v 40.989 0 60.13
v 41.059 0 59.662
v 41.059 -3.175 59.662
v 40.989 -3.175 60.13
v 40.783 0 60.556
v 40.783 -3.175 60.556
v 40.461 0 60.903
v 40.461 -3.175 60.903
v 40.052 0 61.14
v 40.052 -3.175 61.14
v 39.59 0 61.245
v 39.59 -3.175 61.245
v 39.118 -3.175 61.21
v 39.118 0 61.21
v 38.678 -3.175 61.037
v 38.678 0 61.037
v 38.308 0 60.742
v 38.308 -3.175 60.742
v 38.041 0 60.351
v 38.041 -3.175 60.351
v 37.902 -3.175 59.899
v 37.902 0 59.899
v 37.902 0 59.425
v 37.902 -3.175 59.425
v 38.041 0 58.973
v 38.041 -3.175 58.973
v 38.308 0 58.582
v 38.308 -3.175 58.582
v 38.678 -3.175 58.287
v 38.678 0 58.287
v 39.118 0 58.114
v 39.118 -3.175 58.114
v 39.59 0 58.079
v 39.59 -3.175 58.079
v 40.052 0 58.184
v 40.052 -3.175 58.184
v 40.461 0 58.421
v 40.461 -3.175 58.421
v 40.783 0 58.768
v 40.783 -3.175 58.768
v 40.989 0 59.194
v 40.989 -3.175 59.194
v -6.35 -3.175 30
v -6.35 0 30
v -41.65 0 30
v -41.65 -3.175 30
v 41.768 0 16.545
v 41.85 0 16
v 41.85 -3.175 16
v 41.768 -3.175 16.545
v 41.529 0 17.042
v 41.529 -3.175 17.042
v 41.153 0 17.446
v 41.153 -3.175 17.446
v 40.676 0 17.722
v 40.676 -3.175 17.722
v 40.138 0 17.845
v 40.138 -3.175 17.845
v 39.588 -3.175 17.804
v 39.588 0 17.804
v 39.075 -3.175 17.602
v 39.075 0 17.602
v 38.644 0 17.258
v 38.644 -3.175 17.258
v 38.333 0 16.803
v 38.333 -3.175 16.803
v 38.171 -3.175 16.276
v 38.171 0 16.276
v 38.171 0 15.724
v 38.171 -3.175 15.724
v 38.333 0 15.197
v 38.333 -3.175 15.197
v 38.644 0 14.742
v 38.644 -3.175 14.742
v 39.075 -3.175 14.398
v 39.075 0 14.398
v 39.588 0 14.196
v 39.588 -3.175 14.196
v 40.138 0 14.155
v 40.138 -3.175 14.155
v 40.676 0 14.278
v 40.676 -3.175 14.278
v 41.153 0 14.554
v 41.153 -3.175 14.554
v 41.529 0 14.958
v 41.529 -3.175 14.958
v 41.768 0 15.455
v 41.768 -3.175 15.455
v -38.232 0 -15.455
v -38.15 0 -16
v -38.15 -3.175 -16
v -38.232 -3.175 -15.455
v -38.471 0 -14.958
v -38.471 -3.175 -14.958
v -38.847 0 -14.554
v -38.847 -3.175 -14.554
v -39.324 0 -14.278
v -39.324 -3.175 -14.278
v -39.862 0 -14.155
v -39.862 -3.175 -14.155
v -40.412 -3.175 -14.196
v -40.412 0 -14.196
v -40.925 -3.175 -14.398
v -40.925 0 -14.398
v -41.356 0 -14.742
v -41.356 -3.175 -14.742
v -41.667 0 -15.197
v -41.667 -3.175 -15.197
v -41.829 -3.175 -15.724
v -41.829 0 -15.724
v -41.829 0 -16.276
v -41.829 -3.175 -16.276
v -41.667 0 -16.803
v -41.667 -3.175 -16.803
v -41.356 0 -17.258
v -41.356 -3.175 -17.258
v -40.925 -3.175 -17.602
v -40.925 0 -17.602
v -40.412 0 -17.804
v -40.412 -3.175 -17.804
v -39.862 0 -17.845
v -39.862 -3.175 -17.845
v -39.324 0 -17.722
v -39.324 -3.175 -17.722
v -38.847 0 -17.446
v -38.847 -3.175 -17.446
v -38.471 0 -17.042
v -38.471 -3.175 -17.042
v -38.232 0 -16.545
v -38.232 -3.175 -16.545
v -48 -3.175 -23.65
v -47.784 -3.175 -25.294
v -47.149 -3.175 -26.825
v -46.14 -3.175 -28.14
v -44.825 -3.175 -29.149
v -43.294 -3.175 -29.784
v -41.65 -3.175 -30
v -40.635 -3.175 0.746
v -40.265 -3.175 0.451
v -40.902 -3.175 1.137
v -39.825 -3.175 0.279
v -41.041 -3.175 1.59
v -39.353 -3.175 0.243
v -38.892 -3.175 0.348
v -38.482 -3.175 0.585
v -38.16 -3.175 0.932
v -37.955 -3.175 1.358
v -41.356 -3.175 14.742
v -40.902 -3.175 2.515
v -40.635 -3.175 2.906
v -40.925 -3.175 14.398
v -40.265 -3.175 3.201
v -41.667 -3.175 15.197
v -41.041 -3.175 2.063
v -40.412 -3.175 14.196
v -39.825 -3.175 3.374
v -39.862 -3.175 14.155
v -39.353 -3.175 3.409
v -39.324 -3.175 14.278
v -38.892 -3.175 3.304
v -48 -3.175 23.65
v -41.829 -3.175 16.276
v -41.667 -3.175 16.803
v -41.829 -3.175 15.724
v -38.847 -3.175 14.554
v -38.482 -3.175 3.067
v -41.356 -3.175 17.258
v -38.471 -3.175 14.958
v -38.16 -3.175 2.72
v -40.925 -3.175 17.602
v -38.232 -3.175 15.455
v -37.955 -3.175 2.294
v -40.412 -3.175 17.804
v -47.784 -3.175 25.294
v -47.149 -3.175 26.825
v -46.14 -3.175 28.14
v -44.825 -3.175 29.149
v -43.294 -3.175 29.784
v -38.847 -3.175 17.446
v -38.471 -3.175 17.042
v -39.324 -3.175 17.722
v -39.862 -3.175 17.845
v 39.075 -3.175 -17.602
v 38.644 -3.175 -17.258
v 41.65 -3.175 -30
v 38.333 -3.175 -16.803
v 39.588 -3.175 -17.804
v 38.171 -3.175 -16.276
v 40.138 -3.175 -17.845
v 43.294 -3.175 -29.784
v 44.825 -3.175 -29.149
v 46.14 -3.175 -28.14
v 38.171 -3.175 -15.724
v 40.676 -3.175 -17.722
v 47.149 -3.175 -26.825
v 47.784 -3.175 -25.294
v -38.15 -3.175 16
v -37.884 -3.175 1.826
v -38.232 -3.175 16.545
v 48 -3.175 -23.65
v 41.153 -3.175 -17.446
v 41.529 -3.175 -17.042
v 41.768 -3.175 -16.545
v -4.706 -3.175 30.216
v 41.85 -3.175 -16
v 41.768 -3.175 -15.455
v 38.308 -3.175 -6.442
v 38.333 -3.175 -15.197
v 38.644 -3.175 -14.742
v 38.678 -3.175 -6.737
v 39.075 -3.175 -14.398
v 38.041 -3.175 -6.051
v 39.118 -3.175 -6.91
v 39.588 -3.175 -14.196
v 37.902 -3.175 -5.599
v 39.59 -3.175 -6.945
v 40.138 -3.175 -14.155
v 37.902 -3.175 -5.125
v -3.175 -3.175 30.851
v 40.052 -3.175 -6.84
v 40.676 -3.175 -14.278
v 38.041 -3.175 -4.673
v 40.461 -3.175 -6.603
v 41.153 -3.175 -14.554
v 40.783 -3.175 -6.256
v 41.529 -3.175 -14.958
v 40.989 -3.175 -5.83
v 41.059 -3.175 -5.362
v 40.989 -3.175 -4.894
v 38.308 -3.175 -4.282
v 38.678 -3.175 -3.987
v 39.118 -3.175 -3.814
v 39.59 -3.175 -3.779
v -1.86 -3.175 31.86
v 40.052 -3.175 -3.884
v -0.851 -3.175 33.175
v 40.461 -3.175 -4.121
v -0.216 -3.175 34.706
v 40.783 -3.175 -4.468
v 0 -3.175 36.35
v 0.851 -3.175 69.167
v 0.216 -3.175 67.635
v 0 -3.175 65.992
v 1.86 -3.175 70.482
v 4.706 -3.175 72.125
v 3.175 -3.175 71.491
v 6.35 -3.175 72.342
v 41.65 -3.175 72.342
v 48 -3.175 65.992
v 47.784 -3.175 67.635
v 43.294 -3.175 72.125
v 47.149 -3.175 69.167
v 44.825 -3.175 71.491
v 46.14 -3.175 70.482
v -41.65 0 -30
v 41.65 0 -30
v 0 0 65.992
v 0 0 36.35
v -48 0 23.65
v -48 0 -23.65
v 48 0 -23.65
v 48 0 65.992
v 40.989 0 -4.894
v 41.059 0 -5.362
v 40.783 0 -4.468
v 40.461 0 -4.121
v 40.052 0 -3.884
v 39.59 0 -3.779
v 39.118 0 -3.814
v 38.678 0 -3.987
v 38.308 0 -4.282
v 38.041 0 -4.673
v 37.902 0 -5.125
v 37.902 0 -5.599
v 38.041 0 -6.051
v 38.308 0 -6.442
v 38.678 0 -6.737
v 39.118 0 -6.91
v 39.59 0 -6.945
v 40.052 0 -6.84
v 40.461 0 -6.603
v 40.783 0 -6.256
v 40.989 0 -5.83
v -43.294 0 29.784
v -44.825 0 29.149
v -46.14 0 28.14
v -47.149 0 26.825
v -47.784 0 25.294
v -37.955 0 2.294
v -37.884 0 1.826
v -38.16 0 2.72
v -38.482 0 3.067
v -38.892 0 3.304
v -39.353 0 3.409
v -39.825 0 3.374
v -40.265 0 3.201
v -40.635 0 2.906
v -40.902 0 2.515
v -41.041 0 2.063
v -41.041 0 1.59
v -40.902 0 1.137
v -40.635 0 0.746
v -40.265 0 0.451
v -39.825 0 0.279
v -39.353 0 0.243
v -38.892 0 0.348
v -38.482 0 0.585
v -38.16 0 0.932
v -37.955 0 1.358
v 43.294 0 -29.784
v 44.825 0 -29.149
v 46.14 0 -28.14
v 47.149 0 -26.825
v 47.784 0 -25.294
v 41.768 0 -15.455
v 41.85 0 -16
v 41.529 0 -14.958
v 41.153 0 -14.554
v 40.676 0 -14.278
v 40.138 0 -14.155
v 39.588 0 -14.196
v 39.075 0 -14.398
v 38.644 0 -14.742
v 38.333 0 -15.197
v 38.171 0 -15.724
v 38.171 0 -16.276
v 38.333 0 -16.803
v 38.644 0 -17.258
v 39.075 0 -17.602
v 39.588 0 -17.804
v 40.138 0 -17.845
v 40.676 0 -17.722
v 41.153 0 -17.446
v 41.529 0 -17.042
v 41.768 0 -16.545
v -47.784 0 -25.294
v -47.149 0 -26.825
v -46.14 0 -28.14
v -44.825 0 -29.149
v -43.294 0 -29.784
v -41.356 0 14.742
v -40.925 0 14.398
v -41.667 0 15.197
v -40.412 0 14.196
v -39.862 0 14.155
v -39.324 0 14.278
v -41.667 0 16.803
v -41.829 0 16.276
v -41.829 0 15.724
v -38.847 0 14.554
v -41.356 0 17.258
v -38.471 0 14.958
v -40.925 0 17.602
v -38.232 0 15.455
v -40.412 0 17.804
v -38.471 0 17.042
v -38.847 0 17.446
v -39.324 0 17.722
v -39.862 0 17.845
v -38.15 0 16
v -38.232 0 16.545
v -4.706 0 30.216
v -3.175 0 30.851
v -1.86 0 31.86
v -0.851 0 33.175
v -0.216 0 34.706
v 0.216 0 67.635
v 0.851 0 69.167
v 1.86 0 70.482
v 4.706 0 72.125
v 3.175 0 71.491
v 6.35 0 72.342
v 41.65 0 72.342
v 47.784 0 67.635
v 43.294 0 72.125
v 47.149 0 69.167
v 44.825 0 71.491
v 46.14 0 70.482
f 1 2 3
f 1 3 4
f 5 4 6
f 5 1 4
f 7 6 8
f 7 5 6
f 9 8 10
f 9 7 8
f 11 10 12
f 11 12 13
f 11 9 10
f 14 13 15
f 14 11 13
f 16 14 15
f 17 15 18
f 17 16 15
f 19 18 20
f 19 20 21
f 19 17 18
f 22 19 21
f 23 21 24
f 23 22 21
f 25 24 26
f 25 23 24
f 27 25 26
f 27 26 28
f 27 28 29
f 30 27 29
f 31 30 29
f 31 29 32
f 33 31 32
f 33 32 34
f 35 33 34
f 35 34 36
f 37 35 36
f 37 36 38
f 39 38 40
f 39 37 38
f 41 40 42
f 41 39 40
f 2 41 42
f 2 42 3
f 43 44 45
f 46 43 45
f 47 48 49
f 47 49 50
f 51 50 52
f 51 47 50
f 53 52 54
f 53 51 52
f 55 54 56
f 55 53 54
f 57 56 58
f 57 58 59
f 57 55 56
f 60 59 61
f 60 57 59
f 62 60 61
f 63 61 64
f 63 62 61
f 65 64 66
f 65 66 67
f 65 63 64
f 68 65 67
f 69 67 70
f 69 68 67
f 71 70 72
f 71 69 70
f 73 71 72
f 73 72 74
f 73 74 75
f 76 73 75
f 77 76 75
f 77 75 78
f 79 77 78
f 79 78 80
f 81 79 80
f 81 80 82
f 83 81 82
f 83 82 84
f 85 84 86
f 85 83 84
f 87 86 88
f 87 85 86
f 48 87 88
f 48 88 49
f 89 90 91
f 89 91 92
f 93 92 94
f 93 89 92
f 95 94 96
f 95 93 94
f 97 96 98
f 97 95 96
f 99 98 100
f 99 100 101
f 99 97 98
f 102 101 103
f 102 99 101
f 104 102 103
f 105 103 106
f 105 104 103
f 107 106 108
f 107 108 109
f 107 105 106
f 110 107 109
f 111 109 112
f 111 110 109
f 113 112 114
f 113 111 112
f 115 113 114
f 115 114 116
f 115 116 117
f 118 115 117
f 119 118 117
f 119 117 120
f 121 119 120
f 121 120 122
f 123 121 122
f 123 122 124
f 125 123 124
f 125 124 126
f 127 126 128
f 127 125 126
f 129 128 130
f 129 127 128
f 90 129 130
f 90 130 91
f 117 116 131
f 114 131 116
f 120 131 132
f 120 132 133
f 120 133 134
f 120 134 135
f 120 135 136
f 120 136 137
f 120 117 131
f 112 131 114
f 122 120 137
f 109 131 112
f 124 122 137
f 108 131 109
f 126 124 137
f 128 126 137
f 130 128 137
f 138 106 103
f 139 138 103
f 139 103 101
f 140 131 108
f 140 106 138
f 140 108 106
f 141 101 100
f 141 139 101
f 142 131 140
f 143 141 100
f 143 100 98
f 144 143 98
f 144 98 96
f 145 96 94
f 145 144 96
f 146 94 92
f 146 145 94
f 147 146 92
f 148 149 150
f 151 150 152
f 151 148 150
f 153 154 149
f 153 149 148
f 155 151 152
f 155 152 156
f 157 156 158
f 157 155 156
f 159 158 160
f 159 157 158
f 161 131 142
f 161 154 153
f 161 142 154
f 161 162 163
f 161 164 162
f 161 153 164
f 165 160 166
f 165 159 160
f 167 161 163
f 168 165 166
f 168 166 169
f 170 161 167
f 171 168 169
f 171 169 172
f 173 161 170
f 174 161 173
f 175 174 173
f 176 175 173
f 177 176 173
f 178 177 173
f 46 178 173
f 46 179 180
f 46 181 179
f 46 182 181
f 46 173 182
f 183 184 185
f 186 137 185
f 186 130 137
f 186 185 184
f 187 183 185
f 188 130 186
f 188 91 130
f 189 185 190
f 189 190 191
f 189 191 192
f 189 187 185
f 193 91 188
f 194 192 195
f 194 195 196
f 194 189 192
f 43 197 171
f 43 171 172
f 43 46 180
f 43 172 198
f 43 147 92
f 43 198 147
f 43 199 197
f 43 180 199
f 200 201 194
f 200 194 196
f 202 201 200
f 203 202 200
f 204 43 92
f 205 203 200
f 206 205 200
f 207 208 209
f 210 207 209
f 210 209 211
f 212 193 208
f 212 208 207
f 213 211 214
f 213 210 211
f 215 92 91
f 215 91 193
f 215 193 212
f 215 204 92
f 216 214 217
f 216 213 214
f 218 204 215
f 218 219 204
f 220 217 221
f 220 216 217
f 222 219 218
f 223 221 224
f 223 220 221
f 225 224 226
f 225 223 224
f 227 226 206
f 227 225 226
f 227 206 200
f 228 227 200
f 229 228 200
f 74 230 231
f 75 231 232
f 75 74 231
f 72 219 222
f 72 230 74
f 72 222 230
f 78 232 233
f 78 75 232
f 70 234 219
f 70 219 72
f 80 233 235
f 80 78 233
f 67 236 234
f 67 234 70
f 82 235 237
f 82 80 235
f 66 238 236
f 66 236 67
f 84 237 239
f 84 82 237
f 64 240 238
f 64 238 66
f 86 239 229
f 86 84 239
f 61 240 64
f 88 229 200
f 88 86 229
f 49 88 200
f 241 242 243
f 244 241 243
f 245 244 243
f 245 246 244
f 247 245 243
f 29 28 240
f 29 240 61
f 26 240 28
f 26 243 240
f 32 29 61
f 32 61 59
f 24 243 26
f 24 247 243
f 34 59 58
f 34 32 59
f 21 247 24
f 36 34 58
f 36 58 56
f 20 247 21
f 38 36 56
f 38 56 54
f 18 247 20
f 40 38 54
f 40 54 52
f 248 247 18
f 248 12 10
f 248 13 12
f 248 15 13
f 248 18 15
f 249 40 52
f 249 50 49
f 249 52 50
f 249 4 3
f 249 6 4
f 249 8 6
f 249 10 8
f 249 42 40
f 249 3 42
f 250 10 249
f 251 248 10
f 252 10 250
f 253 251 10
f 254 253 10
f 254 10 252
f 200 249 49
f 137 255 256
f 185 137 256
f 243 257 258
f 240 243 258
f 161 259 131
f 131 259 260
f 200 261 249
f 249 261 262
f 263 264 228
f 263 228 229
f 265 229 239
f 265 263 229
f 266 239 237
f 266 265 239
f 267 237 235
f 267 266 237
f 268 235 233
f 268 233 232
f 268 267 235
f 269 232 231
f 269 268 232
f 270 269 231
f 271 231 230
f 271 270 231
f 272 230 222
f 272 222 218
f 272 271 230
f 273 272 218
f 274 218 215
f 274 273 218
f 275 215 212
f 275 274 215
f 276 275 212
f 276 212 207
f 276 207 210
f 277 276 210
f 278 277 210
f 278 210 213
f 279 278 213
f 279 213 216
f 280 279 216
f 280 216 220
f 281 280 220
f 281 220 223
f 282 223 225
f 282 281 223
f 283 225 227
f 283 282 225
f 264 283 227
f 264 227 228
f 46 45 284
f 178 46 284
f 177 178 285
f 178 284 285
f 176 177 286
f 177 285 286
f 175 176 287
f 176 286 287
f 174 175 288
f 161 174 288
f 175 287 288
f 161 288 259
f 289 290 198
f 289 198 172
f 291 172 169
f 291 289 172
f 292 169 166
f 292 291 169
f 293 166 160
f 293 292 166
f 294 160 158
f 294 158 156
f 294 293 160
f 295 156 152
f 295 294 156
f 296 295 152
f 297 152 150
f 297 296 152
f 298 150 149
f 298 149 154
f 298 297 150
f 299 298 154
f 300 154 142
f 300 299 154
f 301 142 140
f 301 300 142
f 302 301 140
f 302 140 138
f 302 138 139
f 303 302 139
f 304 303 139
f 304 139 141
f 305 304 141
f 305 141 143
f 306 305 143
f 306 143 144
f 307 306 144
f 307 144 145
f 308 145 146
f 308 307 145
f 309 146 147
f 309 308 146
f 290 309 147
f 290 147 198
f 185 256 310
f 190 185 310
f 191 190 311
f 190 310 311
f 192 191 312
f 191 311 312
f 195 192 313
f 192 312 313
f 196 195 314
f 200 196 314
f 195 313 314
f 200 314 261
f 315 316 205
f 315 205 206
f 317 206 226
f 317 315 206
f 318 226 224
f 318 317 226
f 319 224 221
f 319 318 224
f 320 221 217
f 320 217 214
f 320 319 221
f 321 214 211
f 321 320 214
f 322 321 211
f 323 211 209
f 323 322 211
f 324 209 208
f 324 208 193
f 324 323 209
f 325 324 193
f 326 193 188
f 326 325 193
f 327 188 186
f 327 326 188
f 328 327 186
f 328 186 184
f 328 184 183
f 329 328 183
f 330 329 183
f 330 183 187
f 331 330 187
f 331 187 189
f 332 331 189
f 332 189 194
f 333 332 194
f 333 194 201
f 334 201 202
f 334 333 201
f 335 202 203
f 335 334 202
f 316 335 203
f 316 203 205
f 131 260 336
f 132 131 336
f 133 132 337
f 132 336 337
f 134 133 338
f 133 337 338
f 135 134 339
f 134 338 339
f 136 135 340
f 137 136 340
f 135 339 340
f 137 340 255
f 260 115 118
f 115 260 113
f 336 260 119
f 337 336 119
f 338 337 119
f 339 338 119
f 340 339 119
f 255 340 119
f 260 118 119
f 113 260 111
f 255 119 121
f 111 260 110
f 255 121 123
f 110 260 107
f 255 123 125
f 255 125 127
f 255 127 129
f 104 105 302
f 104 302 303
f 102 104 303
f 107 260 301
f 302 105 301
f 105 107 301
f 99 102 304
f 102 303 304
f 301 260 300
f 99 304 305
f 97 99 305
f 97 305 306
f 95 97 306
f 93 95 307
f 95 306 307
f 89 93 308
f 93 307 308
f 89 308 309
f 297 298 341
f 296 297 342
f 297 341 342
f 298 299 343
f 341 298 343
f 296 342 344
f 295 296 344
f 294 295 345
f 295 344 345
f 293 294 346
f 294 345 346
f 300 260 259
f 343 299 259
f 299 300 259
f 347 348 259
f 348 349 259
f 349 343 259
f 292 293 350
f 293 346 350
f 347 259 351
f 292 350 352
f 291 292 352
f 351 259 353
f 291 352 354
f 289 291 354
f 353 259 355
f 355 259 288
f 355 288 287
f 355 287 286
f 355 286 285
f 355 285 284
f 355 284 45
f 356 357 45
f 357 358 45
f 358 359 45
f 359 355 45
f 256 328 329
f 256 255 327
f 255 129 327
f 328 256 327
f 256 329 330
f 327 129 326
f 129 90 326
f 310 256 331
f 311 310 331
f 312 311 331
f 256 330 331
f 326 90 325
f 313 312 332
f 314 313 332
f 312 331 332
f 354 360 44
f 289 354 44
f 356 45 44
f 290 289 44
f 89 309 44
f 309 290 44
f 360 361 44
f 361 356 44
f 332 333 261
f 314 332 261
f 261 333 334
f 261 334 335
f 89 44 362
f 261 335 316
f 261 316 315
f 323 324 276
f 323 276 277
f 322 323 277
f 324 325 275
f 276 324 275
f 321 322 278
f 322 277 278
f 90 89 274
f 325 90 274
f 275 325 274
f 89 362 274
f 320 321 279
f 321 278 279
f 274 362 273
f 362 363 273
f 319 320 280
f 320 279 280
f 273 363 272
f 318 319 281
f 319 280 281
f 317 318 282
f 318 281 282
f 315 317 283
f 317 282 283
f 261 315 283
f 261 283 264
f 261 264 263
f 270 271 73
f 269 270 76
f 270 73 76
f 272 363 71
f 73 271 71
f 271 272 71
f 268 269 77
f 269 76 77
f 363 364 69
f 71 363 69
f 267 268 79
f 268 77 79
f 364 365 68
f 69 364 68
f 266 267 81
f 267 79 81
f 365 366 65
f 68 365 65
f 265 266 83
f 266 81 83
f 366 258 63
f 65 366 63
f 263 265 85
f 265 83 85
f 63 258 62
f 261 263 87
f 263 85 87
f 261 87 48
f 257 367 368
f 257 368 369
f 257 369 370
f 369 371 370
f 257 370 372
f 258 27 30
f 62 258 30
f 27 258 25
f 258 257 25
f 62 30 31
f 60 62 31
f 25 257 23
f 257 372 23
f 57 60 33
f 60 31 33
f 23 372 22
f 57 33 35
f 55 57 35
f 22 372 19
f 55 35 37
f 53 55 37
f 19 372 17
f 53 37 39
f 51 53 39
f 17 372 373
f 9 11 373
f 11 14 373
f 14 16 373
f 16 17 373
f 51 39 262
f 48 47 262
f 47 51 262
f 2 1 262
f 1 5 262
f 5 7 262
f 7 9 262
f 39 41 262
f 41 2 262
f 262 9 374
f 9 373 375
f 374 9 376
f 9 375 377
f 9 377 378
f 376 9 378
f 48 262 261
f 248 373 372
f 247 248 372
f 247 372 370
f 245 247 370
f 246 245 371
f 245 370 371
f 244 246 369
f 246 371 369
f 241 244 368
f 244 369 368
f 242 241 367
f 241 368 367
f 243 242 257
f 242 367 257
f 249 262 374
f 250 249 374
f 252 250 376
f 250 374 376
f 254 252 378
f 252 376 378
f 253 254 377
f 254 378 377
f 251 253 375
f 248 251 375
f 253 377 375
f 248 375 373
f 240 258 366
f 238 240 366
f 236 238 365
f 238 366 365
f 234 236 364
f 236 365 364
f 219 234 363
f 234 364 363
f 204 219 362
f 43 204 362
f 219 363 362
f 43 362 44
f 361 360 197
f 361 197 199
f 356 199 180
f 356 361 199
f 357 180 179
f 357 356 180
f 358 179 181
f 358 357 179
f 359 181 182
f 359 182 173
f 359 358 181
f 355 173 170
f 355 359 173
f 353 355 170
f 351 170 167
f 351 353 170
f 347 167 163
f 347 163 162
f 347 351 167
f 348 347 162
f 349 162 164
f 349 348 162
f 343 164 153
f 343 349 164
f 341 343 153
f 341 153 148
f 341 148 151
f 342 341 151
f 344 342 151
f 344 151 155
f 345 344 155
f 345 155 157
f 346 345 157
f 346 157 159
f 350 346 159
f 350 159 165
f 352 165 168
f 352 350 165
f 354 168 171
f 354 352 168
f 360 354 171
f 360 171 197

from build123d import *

# Parameters (mm, degrees)
F0_R     = 1.85
F0_R_2   = 1.5875
F1_DEPTH = 3.175


with BuildPart() as f1:
    # F0 (on Front) → F1 (new body)
    with BuildSketch(Plane.XZ):
        with BuildLine():
            ThreePointArc((-48, -23.65), (-46.140128, -28.140128), (-41.65, -30))
            Line((-41.65, -30), (41.65, -30))
            ThreePointArc((41.65, -30), (46.140128, -28.140128), (48, -23.65))
            Line((48, -23.65), (48, 30))
            Line((48, 30), (48, 65.99177))
            ThreePointArc((48, 65.99177), (46.140128, 70.481898), (41.65, 72.34177))
            Line((41.65, 72.34177), (6.35, 72.34177))
            ThreePointArc((6.35, 72.34177), (1.859872, 70.481898), (0, 65.99177))
            Line((0, 65.99177), (0, 36.35))
            ThreePointArc((0, 36.35), (-1.859872, 31.859872), (-6.35, 30))
            Line((-6.35, 30), (-41.65, 30))
            ThreePointArc((-41.65, 30), (-46.140128, 28.140128), (-48, 23.65))
            Line((-48, 23.65), (-48, -23.65))
        make_face()
        with Locations((-40, -16)):
            Circle(F0_R, mode=Mode.SUBTRACT)
        with Locations((-39.4716, 1.8262)):
            Circle(F0_R_2, mode=Mode.SUBTRACT)
        with Locations((-40, 16)):
            Circle(F0_R, mode=Mode.SUBTRACT)
        with Locations((40, -16)):
            Circle(F0_R, mode=Mode.SUBTRACT)
        with Locations((39.4716, -5.362)):
            Circle(F0_R_2, mode=Mode.SUBTRACT)
        with Locations((40, 16)):
            Circle(F0_R, mode=Mode.SUBTRACT)
        with Locations((39.4716, 59.662)):
            Circle(F0_R_2, mode=Mode.SUBTRACT)
    extrude(amount=F1_DEPTH)


solid = f1.part
